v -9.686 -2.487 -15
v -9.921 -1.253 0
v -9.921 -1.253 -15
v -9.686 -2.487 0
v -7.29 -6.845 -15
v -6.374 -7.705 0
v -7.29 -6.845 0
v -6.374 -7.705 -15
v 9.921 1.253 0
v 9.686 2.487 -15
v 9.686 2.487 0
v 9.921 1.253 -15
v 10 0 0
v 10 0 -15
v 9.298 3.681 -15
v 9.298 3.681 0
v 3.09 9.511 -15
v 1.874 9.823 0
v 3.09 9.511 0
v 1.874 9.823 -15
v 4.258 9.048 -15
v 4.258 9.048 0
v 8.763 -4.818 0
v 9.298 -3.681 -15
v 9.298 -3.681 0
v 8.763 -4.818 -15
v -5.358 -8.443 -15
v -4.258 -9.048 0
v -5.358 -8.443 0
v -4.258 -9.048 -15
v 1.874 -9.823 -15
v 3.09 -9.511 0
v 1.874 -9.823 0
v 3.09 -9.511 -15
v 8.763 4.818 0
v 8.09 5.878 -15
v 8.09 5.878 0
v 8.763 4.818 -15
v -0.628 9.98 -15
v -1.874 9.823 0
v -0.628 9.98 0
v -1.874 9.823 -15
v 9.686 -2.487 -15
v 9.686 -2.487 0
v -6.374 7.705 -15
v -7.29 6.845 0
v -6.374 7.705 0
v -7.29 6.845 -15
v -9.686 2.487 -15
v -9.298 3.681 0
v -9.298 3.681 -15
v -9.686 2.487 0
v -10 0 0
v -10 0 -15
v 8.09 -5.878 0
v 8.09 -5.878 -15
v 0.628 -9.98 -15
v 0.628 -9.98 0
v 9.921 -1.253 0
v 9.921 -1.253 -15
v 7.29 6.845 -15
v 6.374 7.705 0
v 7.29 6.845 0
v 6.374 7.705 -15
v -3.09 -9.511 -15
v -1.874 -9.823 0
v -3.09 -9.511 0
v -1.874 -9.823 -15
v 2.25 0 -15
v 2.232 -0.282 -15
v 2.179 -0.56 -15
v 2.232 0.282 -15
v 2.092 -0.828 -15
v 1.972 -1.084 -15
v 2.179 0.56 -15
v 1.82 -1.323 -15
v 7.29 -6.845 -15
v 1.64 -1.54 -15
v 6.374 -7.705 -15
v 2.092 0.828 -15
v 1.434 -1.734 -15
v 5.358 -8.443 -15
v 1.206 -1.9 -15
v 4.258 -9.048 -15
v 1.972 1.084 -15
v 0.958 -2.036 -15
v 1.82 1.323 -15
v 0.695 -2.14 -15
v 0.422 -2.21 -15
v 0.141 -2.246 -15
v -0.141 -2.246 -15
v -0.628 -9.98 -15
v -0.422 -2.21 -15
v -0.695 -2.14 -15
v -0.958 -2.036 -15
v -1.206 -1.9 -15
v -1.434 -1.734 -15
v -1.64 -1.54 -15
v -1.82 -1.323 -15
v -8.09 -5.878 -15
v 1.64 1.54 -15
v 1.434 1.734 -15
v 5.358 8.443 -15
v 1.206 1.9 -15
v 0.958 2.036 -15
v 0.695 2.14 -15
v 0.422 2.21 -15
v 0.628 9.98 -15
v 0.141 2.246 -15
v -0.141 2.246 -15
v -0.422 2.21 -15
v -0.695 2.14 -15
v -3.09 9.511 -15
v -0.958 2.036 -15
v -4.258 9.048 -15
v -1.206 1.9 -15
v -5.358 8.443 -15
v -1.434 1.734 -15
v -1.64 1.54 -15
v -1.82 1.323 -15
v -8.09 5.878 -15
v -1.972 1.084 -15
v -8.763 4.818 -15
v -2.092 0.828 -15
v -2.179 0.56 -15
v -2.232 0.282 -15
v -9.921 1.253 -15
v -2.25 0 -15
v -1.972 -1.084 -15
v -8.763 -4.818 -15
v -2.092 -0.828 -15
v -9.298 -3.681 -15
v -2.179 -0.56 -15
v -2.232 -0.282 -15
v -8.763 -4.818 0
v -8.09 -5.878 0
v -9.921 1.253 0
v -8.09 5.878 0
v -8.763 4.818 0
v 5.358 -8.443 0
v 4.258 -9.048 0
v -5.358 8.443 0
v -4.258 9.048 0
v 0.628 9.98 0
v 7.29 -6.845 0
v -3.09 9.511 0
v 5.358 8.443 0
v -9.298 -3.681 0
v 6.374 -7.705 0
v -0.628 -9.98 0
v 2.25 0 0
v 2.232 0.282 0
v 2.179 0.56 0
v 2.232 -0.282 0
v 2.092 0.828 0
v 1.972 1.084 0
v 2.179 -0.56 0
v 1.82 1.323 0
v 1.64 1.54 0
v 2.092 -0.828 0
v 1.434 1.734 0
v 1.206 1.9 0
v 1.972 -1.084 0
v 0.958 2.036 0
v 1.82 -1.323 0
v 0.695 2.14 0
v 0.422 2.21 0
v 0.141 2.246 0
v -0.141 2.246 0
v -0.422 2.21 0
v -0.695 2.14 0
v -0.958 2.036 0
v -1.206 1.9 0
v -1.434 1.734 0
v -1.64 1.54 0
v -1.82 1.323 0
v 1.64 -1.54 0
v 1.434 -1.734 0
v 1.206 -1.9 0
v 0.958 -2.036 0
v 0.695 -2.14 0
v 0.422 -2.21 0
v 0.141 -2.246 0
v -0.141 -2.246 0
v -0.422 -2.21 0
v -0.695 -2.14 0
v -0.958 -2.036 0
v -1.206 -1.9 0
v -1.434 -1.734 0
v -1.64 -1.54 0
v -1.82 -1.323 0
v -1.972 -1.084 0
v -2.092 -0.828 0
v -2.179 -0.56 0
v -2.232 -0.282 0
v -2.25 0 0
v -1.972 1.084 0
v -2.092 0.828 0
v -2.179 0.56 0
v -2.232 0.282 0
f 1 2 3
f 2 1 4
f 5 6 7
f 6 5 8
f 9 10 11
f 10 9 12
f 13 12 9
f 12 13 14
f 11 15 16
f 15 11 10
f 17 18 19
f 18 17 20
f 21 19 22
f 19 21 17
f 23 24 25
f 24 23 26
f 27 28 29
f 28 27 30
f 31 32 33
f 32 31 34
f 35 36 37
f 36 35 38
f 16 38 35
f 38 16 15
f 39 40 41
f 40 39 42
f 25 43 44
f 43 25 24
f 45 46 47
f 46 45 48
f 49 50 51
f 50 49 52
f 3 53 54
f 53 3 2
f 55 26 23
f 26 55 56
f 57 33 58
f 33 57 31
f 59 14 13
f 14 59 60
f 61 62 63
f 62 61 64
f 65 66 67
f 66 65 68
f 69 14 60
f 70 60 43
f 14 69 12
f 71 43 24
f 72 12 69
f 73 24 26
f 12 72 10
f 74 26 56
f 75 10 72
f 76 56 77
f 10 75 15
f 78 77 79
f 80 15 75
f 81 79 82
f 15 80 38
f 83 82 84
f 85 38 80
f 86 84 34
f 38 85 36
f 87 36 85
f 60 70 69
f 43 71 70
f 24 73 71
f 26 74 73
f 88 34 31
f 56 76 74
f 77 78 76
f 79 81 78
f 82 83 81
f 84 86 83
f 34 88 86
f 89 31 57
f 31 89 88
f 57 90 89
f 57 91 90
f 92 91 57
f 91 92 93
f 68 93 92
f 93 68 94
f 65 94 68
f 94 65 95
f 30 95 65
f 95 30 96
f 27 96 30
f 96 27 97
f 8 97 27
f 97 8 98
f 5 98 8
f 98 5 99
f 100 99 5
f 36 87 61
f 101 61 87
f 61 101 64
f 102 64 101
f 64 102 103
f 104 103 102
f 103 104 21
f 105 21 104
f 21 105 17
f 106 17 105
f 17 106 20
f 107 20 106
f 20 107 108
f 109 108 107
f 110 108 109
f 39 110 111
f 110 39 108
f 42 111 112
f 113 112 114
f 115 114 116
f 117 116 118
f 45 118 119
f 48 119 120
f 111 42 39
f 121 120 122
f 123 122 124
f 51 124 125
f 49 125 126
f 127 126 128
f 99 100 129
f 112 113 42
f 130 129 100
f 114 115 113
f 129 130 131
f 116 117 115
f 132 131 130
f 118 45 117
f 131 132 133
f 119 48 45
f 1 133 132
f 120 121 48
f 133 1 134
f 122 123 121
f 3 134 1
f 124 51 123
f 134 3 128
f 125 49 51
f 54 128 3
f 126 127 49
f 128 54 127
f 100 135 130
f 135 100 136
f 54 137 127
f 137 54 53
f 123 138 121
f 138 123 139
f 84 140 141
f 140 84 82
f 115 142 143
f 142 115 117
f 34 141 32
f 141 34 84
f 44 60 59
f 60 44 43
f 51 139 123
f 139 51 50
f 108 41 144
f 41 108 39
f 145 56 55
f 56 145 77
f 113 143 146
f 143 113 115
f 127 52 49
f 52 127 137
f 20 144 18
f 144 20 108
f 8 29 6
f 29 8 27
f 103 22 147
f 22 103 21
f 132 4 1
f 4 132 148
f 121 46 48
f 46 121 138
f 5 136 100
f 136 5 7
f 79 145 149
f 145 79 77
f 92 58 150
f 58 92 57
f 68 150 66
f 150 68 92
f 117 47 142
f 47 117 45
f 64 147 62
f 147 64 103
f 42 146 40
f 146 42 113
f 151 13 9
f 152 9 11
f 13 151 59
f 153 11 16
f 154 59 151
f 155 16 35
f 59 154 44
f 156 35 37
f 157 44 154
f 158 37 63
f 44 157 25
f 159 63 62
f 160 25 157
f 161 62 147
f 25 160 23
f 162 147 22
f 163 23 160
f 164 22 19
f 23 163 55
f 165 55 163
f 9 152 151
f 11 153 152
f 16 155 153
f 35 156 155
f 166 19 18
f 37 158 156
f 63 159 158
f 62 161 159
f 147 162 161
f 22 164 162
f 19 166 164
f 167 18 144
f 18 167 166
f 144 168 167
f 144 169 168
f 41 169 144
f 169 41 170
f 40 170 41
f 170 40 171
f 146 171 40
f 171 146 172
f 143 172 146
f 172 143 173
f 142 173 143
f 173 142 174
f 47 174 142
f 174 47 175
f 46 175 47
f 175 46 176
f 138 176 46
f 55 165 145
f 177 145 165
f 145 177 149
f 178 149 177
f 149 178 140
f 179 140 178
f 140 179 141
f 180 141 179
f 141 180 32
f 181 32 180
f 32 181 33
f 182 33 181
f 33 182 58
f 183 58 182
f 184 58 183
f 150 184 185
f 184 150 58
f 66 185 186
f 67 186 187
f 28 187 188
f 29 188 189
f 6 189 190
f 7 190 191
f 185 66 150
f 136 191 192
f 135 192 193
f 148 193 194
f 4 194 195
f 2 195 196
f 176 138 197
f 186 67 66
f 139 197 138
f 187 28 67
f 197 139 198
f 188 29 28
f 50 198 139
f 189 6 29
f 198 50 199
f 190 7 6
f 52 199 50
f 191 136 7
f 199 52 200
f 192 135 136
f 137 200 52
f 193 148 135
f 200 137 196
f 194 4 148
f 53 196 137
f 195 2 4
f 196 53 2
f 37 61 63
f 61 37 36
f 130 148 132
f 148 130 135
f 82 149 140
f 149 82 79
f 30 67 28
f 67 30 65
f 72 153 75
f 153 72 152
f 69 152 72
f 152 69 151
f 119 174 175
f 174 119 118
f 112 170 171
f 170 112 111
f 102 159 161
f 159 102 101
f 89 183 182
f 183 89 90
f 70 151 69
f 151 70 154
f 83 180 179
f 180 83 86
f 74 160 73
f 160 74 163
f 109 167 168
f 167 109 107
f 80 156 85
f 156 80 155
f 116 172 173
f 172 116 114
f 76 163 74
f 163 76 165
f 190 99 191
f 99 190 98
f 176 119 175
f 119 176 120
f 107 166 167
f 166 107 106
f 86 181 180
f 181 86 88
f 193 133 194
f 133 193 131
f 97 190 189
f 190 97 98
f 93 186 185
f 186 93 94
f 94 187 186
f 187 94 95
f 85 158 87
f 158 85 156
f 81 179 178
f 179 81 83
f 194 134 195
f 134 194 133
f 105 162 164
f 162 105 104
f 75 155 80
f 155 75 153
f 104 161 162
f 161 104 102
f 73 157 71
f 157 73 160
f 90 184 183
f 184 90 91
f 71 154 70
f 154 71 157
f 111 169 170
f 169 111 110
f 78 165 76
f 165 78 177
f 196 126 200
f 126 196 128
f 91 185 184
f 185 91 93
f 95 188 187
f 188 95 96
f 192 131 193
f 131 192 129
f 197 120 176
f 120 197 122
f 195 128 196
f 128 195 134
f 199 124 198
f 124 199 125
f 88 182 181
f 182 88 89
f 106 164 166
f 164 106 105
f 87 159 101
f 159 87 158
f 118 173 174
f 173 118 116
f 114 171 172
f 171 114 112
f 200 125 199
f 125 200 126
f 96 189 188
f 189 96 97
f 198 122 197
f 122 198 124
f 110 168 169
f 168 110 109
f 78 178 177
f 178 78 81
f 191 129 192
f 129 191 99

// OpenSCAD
$fn = 50;


difference() {
	union() {
		translate(v = [0, 0, -15.0000000000]) {
			cylinder(h = 15, r = 10.0000000000);
		}
	}
	union() {
		#translate(v = [0, 0, -15]) {
			cylinder(h = 15, r = 2.2500000000);
		}
	}
}
